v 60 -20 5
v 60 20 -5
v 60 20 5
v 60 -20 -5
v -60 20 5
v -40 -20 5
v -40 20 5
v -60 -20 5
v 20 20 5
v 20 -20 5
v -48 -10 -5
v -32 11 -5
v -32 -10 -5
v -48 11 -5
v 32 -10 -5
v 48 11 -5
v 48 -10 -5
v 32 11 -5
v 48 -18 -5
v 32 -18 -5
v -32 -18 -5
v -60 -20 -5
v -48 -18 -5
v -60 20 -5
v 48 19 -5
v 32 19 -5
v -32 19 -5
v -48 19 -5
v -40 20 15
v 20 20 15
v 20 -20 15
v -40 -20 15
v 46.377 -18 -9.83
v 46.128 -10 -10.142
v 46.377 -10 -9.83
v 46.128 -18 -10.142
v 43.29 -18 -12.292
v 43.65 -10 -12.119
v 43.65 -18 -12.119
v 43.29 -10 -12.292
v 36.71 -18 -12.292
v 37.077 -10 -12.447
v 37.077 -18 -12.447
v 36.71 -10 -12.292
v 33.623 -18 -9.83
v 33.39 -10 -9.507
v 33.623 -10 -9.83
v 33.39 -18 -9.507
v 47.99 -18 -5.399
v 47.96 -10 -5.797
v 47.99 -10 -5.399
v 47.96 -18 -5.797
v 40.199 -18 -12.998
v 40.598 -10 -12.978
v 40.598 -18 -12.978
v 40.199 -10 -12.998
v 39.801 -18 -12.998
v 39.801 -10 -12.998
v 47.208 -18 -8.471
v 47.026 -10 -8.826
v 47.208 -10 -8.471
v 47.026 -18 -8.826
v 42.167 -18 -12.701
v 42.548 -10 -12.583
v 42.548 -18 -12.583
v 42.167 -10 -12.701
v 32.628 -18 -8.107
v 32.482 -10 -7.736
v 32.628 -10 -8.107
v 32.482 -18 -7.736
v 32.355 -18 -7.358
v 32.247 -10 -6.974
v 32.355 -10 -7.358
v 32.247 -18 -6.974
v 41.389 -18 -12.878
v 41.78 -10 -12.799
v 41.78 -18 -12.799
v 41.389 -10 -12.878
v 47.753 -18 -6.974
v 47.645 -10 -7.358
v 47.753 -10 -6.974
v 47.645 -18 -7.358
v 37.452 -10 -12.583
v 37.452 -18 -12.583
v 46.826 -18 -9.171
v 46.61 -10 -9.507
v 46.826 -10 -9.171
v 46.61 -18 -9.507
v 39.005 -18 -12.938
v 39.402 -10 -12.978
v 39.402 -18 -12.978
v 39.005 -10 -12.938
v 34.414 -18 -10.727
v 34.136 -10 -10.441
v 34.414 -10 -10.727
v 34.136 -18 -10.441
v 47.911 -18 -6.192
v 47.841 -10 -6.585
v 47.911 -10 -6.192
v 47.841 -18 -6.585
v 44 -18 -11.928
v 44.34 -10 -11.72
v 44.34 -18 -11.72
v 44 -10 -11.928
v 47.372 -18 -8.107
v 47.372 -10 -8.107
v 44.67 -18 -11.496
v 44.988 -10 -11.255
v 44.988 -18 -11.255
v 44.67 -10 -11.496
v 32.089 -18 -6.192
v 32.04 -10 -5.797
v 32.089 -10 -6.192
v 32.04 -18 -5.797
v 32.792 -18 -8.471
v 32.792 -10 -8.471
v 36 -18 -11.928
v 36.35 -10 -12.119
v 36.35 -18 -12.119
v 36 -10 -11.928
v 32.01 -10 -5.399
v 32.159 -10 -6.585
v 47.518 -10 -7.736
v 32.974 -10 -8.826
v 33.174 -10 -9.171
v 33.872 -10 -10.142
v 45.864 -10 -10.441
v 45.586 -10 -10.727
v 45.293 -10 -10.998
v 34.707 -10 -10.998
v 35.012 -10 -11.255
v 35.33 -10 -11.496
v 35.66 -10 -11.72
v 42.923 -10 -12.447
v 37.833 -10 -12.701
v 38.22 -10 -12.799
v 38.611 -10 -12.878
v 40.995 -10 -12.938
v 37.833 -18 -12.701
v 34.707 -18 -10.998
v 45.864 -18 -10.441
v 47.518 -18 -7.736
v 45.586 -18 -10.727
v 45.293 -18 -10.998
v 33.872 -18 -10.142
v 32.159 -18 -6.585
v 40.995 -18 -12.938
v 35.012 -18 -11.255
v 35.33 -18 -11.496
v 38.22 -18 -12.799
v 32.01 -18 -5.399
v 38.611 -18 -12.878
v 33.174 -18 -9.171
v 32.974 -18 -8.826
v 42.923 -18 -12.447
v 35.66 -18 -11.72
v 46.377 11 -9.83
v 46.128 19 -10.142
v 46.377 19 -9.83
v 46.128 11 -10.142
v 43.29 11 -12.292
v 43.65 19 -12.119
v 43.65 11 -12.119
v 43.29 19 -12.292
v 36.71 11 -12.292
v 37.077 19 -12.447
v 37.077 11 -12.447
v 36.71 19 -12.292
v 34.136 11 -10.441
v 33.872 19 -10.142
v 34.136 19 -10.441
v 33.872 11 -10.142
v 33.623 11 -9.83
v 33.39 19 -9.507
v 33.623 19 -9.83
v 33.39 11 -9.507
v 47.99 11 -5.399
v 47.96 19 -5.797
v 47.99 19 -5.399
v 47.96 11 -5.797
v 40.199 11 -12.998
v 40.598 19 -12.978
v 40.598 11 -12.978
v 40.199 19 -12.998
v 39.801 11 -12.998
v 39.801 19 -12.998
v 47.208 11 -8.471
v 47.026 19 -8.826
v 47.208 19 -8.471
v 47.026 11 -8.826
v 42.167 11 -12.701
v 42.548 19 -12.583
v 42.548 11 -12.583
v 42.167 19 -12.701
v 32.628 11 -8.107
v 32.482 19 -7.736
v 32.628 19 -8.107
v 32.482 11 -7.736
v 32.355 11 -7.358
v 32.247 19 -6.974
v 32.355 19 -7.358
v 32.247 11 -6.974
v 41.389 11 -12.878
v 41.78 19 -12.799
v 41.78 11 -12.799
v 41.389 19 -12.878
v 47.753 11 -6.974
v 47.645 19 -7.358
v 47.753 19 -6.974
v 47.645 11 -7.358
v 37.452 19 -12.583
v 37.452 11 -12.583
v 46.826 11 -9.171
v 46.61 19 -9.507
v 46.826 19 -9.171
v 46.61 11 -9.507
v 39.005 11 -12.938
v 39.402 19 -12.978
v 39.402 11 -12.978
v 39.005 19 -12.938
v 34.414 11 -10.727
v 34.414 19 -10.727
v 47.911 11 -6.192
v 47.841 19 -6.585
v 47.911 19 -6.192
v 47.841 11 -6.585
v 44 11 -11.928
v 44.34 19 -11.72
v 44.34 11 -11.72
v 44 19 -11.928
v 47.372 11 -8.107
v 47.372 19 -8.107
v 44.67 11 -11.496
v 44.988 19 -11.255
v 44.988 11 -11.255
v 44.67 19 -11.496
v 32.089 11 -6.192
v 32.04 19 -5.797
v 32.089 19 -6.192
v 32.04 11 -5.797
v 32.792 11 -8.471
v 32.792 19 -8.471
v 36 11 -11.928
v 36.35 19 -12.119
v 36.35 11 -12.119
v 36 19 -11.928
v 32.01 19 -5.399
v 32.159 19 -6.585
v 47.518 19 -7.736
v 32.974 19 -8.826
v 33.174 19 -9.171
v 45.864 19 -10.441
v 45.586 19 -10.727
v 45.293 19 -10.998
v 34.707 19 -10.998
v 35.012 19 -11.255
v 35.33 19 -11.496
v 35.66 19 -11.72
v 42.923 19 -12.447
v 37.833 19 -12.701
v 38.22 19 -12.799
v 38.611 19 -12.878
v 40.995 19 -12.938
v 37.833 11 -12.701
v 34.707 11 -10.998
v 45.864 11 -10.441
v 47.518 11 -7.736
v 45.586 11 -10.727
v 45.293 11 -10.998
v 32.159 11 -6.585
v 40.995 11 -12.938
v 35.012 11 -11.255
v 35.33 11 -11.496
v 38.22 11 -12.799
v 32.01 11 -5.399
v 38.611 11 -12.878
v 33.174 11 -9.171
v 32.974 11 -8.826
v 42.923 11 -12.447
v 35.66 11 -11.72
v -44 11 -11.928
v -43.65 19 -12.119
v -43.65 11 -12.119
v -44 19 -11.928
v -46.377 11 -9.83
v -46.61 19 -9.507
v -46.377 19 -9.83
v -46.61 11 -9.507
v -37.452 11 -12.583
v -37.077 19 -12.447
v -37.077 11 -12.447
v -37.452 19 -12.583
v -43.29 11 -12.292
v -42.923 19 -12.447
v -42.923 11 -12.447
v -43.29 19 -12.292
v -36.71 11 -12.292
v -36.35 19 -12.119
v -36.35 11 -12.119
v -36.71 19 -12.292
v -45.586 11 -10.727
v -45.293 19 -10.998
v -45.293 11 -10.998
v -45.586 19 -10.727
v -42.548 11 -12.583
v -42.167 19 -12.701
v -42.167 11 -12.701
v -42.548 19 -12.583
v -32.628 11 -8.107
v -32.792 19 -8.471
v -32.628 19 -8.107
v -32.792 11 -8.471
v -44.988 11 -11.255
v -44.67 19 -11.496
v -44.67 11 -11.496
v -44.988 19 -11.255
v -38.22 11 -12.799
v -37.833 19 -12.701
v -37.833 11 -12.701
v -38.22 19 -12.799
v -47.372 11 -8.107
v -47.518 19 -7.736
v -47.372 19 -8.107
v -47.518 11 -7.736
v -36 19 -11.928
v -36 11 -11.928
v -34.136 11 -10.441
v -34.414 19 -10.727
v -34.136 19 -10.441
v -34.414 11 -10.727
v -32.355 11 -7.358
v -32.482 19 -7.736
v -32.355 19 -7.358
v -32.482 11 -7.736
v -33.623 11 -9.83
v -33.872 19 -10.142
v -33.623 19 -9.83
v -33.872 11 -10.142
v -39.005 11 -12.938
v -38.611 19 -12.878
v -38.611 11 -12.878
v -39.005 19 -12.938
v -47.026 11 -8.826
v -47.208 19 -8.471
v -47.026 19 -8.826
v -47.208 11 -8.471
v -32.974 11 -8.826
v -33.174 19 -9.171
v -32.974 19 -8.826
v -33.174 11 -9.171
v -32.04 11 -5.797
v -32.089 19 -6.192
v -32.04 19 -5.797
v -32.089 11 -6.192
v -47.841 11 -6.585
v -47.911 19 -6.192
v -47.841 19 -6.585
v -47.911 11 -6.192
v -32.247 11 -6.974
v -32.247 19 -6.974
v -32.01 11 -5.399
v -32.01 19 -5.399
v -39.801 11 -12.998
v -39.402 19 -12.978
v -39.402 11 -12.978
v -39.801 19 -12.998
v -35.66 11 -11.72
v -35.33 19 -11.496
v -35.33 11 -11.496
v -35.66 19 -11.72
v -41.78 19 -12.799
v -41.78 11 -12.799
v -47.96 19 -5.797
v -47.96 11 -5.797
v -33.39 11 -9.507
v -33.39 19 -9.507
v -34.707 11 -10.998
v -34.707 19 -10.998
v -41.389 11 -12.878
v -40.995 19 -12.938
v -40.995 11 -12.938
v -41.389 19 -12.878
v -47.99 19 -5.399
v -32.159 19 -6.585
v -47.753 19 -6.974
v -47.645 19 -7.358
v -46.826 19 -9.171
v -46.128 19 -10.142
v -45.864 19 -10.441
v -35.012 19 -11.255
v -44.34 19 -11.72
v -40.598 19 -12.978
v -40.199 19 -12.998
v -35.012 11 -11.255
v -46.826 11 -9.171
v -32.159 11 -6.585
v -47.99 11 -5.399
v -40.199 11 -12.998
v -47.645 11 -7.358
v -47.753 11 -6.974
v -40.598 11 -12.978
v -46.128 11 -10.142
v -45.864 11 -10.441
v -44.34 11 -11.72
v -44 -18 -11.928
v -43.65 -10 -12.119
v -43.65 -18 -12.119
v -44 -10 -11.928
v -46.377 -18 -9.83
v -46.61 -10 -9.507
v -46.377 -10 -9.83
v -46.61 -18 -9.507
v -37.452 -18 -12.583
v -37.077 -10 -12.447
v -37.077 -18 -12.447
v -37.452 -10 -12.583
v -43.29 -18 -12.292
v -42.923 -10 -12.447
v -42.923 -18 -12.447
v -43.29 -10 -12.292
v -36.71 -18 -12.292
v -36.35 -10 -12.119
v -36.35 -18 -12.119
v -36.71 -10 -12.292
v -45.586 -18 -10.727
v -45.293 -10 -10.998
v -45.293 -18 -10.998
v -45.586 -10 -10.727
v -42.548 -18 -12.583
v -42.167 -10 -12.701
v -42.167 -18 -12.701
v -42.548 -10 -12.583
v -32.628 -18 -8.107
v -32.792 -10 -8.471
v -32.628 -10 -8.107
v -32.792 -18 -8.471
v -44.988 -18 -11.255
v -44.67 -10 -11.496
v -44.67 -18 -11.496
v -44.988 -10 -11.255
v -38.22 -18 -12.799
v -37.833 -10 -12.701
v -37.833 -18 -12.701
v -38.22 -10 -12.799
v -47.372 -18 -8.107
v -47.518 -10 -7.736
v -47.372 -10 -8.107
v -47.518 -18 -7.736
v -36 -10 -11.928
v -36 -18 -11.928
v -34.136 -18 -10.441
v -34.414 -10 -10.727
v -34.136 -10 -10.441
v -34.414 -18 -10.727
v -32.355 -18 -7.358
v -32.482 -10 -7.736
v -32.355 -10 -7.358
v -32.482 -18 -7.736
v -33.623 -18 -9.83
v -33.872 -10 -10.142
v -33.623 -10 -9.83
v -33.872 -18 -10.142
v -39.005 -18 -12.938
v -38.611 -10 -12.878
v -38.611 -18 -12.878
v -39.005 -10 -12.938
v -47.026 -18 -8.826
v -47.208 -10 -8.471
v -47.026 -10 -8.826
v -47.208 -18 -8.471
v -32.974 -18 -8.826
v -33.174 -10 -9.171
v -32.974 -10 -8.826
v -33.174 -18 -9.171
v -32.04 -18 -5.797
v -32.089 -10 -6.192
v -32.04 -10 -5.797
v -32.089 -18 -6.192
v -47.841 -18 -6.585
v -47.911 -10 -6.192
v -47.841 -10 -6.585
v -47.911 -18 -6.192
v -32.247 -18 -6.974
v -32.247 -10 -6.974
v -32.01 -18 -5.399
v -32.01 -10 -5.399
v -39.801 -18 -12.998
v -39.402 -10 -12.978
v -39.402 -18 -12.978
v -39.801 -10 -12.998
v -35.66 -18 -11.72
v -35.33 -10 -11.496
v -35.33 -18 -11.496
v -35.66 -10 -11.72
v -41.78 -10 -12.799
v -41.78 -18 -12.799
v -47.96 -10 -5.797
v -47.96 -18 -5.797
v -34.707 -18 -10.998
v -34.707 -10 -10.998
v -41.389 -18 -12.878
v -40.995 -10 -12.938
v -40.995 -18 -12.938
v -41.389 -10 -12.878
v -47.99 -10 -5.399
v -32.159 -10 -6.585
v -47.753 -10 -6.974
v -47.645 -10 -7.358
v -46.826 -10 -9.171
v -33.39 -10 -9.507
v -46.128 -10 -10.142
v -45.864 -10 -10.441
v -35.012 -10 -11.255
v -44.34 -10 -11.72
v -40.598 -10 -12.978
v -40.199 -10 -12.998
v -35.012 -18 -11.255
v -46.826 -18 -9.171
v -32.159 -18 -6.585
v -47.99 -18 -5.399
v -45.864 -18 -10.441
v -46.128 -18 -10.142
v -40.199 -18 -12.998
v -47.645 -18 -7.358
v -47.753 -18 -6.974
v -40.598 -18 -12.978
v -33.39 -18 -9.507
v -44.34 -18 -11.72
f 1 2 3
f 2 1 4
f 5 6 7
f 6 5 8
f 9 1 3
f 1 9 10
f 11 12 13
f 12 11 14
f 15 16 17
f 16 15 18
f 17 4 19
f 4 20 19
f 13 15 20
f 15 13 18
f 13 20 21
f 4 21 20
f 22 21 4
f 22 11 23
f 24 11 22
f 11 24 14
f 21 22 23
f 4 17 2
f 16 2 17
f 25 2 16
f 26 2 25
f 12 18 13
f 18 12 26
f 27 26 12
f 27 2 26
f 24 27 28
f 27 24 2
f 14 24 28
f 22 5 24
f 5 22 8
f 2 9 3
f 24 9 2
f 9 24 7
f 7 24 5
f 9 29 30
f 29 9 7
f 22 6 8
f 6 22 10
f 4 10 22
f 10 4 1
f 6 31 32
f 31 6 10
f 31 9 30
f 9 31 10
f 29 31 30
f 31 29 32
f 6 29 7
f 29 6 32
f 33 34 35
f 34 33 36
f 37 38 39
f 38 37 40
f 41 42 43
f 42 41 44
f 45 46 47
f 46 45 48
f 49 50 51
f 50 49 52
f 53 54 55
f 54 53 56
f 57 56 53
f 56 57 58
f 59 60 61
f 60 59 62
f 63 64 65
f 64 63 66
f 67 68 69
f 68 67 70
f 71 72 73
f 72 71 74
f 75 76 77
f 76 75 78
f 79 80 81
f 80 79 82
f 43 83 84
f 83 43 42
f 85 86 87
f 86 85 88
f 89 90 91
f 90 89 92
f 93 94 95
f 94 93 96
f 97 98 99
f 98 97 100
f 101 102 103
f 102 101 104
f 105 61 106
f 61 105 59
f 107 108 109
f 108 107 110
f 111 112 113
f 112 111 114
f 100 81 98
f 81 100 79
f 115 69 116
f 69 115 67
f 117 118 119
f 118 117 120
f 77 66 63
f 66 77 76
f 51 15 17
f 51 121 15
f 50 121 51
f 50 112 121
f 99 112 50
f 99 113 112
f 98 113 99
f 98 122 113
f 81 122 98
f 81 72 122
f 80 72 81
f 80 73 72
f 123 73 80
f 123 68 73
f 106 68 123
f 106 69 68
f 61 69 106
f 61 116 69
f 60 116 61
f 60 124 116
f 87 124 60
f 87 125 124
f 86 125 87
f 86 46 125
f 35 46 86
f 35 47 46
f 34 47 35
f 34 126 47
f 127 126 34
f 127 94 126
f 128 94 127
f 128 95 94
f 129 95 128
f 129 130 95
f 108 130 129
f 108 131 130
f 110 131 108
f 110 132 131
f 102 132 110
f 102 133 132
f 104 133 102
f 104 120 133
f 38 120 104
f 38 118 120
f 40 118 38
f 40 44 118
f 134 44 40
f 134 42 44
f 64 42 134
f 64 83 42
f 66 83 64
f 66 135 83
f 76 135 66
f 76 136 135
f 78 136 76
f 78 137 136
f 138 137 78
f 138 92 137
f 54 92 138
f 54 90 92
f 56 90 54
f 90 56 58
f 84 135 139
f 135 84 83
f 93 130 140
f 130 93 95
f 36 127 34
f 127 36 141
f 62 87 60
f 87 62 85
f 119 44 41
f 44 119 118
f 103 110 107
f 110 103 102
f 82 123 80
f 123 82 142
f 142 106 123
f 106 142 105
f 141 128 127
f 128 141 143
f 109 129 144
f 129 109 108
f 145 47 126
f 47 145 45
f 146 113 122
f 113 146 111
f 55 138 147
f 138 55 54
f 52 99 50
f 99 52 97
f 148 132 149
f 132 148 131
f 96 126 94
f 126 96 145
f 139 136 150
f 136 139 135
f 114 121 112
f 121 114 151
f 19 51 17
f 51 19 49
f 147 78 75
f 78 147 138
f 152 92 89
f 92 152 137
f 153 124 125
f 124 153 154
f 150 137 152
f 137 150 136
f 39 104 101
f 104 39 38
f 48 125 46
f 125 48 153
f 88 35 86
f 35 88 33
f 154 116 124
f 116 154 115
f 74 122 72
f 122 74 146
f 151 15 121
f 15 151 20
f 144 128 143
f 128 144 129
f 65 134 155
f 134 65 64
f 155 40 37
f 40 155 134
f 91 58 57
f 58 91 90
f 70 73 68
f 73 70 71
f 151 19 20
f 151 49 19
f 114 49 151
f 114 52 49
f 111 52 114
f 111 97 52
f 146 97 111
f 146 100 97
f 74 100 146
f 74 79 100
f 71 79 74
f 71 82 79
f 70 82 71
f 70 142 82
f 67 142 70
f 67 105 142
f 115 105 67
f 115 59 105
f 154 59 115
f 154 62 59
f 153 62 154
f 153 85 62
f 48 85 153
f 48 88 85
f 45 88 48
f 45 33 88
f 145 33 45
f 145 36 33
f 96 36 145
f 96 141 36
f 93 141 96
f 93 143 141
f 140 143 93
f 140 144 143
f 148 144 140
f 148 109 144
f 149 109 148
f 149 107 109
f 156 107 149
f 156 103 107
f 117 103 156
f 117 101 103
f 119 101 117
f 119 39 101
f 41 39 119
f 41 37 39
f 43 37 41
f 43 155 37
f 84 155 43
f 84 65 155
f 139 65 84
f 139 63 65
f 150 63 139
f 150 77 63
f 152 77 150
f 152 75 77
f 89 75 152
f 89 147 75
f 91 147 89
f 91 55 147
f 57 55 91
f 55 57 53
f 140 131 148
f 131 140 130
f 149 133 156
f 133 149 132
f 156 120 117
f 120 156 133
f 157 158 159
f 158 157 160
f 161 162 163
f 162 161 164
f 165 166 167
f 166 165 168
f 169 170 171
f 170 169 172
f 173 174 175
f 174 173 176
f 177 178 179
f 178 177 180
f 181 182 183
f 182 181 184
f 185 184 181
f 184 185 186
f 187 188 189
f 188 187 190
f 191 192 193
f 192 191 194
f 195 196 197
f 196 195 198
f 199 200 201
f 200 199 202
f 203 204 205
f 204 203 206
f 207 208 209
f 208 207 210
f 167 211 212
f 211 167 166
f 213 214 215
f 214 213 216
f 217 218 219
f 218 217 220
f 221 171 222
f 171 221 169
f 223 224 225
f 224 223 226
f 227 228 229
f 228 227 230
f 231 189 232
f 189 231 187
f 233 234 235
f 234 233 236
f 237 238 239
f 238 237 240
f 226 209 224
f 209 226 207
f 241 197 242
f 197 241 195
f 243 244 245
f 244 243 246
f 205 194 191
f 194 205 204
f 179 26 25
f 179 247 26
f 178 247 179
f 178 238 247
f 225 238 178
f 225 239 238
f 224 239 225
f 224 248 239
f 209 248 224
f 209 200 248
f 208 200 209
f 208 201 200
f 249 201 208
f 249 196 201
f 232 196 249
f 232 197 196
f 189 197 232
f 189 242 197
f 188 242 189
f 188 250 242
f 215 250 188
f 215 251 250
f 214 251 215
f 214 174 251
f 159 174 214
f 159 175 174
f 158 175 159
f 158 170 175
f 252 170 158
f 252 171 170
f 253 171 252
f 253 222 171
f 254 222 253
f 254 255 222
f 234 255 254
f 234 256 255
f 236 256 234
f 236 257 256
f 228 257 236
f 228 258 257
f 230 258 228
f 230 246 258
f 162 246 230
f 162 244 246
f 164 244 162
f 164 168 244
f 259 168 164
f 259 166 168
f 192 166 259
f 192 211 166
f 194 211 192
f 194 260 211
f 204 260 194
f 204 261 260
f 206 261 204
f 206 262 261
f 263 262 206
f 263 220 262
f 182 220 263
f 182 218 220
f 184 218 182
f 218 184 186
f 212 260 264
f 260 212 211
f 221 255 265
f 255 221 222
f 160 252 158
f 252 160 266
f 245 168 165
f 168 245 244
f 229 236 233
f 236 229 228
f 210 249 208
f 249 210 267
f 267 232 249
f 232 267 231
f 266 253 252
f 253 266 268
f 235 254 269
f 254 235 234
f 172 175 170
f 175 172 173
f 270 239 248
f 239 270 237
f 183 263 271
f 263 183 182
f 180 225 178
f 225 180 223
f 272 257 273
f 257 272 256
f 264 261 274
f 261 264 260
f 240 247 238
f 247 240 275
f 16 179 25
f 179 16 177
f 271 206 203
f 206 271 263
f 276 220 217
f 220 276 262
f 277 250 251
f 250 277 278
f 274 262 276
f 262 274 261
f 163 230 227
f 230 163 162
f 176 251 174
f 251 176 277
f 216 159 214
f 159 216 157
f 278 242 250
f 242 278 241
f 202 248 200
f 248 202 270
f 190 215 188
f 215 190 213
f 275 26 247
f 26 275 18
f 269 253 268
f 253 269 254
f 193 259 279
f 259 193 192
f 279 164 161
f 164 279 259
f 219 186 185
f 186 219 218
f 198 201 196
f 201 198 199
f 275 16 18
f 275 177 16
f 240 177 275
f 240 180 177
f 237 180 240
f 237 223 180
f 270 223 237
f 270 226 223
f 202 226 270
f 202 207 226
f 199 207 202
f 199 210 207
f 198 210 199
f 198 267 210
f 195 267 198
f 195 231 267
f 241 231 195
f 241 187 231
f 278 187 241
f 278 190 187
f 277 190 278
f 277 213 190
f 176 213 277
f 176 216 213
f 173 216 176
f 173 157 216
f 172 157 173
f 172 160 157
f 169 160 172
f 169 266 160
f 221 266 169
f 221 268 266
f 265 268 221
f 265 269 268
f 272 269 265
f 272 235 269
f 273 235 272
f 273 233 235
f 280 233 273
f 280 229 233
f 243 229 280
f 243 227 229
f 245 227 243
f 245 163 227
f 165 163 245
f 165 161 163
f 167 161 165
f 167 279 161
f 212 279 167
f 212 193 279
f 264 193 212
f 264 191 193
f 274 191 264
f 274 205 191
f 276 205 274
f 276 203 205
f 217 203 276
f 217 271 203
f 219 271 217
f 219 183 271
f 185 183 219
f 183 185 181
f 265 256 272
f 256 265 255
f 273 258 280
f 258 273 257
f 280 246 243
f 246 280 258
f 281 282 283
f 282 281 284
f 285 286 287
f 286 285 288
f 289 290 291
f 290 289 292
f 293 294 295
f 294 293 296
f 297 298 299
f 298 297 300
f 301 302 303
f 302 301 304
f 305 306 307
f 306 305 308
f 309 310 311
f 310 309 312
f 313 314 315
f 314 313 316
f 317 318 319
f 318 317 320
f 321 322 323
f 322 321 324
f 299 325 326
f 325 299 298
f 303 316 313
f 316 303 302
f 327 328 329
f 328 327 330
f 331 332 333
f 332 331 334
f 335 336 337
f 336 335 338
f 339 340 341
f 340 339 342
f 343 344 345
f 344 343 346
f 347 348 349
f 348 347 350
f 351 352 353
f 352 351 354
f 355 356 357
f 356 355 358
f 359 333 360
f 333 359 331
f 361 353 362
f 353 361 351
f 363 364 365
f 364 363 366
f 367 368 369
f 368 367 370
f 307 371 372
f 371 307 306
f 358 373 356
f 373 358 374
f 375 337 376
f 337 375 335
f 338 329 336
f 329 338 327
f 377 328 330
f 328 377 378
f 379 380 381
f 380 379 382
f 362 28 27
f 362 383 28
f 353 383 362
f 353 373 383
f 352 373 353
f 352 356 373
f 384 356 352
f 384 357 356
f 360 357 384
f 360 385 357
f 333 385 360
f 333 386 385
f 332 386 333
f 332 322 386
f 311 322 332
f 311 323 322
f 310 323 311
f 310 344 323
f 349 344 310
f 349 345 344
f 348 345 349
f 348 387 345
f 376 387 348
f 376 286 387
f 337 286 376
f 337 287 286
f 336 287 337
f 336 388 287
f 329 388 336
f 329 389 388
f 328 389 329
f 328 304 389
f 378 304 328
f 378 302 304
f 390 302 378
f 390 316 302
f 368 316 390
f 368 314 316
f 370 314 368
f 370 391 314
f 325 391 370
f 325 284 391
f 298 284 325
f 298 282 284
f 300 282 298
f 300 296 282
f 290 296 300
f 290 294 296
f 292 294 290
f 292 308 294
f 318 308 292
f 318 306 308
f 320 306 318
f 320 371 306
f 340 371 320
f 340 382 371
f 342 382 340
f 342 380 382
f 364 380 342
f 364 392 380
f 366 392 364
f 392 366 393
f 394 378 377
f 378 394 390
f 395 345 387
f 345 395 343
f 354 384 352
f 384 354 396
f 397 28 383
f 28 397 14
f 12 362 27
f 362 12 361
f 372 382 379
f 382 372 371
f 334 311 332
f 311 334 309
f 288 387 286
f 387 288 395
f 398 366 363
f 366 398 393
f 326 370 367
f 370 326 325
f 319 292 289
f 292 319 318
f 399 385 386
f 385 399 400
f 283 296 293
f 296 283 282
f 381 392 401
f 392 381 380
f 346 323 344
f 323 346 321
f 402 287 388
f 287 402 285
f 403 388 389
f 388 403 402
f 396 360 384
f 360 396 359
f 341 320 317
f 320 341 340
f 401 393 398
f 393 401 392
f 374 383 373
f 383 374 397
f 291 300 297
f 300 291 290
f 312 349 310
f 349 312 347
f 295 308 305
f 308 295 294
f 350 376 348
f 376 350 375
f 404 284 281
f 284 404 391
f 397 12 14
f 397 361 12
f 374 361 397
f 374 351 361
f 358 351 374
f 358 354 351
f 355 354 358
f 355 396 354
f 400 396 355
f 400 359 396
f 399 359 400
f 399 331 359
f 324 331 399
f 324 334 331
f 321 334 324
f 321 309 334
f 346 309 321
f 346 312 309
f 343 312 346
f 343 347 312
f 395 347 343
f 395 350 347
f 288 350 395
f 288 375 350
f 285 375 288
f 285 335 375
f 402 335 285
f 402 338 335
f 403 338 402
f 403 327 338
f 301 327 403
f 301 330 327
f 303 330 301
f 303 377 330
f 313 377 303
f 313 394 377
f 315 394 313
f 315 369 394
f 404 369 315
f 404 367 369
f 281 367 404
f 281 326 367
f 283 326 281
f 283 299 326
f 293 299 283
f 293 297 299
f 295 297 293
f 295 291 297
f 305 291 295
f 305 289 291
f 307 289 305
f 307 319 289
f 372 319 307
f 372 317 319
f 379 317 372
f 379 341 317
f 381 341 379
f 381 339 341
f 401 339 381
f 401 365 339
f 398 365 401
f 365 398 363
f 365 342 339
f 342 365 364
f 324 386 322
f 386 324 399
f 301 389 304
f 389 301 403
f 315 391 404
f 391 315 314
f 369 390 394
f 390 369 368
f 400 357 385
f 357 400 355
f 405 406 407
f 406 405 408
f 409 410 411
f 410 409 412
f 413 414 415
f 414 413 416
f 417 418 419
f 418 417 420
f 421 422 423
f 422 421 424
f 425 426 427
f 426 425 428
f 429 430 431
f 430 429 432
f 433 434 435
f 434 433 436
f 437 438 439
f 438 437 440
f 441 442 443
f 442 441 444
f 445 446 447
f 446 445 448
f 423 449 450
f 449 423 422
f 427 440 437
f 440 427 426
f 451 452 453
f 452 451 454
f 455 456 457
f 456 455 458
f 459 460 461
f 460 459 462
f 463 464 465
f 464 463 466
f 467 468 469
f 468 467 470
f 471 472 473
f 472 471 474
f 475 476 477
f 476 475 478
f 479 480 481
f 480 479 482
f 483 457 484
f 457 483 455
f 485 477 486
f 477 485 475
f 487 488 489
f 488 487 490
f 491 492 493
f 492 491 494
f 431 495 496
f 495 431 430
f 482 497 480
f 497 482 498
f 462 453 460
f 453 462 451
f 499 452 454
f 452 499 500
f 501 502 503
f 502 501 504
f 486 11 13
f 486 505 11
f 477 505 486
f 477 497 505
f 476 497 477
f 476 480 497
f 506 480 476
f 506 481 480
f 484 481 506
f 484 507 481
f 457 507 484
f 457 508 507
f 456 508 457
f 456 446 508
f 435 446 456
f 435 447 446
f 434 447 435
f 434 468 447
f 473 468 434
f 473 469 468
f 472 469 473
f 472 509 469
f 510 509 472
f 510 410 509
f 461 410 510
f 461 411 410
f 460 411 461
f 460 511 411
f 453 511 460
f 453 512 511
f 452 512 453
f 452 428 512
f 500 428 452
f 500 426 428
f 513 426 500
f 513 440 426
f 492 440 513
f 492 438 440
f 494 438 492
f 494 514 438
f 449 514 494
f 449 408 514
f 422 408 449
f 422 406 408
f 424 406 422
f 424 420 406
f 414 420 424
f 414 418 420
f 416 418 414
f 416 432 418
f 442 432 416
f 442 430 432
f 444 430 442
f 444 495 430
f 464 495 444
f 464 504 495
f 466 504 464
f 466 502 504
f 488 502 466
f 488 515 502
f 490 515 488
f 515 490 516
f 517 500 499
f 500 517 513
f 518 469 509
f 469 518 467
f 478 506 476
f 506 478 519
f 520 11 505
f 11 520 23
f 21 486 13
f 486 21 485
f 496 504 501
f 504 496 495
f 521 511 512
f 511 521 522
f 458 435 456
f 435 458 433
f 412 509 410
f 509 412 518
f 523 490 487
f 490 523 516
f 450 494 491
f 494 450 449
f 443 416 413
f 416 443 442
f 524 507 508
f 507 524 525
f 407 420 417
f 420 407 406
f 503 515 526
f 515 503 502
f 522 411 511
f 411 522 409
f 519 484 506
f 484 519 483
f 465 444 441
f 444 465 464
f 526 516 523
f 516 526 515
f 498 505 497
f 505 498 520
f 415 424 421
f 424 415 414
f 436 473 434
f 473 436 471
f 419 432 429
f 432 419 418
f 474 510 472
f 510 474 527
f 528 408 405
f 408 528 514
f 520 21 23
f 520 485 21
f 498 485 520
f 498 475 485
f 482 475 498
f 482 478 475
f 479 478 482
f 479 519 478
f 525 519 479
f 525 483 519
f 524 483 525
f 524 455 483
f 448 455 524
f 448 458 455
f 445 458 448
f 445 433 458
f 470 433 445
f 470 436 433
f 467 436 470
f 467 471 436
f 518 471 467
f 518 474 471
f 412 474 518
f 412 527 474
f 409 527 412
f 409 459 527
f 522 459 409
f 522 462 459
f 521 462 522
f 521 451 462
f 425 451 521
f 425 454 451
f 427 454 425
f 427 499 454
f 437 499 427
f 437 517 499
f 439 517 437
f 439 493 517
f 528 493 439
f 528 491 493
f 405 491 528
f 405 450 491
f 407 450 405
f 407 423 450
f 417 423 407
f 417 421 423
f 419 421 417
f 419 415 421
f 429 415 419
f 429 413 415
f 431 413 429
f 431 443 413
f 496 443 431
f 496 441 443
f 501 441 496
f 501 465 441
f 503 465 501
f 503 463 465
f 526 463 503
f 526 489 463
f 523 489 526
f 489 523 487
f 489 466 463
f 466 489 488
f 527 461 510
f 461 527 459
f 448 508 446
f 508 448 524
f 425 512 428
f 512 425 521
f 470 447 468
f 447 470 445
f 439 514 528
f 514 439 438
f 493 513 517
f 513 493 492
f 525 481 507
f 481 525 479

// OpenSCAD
$fa = 1;
$fs = 0.4;

// Base

scale([2, 2, 1]) {
    cube([60, 20, 10], center=true);
    translate([-5, 0, 10])
    cube([30, 20, 10], center=true);
}
  
// Wheels

rotate([90, 0, 0])
    translate([40, -5, 10])
    cylinder(h=8, r=8);
    
rotate([90, 0, 0])
    translate([40, -5, -19]) 
    cylinder(h=8, r=8);

rotate([90, 0, 0])
    translate([-40, -5, -19]) 
    cylinder(h=8, r=8);

rotate([90, 0, 0])
    translate([-40, -5, 10]) 
    cylinder(h=8, r=8);
